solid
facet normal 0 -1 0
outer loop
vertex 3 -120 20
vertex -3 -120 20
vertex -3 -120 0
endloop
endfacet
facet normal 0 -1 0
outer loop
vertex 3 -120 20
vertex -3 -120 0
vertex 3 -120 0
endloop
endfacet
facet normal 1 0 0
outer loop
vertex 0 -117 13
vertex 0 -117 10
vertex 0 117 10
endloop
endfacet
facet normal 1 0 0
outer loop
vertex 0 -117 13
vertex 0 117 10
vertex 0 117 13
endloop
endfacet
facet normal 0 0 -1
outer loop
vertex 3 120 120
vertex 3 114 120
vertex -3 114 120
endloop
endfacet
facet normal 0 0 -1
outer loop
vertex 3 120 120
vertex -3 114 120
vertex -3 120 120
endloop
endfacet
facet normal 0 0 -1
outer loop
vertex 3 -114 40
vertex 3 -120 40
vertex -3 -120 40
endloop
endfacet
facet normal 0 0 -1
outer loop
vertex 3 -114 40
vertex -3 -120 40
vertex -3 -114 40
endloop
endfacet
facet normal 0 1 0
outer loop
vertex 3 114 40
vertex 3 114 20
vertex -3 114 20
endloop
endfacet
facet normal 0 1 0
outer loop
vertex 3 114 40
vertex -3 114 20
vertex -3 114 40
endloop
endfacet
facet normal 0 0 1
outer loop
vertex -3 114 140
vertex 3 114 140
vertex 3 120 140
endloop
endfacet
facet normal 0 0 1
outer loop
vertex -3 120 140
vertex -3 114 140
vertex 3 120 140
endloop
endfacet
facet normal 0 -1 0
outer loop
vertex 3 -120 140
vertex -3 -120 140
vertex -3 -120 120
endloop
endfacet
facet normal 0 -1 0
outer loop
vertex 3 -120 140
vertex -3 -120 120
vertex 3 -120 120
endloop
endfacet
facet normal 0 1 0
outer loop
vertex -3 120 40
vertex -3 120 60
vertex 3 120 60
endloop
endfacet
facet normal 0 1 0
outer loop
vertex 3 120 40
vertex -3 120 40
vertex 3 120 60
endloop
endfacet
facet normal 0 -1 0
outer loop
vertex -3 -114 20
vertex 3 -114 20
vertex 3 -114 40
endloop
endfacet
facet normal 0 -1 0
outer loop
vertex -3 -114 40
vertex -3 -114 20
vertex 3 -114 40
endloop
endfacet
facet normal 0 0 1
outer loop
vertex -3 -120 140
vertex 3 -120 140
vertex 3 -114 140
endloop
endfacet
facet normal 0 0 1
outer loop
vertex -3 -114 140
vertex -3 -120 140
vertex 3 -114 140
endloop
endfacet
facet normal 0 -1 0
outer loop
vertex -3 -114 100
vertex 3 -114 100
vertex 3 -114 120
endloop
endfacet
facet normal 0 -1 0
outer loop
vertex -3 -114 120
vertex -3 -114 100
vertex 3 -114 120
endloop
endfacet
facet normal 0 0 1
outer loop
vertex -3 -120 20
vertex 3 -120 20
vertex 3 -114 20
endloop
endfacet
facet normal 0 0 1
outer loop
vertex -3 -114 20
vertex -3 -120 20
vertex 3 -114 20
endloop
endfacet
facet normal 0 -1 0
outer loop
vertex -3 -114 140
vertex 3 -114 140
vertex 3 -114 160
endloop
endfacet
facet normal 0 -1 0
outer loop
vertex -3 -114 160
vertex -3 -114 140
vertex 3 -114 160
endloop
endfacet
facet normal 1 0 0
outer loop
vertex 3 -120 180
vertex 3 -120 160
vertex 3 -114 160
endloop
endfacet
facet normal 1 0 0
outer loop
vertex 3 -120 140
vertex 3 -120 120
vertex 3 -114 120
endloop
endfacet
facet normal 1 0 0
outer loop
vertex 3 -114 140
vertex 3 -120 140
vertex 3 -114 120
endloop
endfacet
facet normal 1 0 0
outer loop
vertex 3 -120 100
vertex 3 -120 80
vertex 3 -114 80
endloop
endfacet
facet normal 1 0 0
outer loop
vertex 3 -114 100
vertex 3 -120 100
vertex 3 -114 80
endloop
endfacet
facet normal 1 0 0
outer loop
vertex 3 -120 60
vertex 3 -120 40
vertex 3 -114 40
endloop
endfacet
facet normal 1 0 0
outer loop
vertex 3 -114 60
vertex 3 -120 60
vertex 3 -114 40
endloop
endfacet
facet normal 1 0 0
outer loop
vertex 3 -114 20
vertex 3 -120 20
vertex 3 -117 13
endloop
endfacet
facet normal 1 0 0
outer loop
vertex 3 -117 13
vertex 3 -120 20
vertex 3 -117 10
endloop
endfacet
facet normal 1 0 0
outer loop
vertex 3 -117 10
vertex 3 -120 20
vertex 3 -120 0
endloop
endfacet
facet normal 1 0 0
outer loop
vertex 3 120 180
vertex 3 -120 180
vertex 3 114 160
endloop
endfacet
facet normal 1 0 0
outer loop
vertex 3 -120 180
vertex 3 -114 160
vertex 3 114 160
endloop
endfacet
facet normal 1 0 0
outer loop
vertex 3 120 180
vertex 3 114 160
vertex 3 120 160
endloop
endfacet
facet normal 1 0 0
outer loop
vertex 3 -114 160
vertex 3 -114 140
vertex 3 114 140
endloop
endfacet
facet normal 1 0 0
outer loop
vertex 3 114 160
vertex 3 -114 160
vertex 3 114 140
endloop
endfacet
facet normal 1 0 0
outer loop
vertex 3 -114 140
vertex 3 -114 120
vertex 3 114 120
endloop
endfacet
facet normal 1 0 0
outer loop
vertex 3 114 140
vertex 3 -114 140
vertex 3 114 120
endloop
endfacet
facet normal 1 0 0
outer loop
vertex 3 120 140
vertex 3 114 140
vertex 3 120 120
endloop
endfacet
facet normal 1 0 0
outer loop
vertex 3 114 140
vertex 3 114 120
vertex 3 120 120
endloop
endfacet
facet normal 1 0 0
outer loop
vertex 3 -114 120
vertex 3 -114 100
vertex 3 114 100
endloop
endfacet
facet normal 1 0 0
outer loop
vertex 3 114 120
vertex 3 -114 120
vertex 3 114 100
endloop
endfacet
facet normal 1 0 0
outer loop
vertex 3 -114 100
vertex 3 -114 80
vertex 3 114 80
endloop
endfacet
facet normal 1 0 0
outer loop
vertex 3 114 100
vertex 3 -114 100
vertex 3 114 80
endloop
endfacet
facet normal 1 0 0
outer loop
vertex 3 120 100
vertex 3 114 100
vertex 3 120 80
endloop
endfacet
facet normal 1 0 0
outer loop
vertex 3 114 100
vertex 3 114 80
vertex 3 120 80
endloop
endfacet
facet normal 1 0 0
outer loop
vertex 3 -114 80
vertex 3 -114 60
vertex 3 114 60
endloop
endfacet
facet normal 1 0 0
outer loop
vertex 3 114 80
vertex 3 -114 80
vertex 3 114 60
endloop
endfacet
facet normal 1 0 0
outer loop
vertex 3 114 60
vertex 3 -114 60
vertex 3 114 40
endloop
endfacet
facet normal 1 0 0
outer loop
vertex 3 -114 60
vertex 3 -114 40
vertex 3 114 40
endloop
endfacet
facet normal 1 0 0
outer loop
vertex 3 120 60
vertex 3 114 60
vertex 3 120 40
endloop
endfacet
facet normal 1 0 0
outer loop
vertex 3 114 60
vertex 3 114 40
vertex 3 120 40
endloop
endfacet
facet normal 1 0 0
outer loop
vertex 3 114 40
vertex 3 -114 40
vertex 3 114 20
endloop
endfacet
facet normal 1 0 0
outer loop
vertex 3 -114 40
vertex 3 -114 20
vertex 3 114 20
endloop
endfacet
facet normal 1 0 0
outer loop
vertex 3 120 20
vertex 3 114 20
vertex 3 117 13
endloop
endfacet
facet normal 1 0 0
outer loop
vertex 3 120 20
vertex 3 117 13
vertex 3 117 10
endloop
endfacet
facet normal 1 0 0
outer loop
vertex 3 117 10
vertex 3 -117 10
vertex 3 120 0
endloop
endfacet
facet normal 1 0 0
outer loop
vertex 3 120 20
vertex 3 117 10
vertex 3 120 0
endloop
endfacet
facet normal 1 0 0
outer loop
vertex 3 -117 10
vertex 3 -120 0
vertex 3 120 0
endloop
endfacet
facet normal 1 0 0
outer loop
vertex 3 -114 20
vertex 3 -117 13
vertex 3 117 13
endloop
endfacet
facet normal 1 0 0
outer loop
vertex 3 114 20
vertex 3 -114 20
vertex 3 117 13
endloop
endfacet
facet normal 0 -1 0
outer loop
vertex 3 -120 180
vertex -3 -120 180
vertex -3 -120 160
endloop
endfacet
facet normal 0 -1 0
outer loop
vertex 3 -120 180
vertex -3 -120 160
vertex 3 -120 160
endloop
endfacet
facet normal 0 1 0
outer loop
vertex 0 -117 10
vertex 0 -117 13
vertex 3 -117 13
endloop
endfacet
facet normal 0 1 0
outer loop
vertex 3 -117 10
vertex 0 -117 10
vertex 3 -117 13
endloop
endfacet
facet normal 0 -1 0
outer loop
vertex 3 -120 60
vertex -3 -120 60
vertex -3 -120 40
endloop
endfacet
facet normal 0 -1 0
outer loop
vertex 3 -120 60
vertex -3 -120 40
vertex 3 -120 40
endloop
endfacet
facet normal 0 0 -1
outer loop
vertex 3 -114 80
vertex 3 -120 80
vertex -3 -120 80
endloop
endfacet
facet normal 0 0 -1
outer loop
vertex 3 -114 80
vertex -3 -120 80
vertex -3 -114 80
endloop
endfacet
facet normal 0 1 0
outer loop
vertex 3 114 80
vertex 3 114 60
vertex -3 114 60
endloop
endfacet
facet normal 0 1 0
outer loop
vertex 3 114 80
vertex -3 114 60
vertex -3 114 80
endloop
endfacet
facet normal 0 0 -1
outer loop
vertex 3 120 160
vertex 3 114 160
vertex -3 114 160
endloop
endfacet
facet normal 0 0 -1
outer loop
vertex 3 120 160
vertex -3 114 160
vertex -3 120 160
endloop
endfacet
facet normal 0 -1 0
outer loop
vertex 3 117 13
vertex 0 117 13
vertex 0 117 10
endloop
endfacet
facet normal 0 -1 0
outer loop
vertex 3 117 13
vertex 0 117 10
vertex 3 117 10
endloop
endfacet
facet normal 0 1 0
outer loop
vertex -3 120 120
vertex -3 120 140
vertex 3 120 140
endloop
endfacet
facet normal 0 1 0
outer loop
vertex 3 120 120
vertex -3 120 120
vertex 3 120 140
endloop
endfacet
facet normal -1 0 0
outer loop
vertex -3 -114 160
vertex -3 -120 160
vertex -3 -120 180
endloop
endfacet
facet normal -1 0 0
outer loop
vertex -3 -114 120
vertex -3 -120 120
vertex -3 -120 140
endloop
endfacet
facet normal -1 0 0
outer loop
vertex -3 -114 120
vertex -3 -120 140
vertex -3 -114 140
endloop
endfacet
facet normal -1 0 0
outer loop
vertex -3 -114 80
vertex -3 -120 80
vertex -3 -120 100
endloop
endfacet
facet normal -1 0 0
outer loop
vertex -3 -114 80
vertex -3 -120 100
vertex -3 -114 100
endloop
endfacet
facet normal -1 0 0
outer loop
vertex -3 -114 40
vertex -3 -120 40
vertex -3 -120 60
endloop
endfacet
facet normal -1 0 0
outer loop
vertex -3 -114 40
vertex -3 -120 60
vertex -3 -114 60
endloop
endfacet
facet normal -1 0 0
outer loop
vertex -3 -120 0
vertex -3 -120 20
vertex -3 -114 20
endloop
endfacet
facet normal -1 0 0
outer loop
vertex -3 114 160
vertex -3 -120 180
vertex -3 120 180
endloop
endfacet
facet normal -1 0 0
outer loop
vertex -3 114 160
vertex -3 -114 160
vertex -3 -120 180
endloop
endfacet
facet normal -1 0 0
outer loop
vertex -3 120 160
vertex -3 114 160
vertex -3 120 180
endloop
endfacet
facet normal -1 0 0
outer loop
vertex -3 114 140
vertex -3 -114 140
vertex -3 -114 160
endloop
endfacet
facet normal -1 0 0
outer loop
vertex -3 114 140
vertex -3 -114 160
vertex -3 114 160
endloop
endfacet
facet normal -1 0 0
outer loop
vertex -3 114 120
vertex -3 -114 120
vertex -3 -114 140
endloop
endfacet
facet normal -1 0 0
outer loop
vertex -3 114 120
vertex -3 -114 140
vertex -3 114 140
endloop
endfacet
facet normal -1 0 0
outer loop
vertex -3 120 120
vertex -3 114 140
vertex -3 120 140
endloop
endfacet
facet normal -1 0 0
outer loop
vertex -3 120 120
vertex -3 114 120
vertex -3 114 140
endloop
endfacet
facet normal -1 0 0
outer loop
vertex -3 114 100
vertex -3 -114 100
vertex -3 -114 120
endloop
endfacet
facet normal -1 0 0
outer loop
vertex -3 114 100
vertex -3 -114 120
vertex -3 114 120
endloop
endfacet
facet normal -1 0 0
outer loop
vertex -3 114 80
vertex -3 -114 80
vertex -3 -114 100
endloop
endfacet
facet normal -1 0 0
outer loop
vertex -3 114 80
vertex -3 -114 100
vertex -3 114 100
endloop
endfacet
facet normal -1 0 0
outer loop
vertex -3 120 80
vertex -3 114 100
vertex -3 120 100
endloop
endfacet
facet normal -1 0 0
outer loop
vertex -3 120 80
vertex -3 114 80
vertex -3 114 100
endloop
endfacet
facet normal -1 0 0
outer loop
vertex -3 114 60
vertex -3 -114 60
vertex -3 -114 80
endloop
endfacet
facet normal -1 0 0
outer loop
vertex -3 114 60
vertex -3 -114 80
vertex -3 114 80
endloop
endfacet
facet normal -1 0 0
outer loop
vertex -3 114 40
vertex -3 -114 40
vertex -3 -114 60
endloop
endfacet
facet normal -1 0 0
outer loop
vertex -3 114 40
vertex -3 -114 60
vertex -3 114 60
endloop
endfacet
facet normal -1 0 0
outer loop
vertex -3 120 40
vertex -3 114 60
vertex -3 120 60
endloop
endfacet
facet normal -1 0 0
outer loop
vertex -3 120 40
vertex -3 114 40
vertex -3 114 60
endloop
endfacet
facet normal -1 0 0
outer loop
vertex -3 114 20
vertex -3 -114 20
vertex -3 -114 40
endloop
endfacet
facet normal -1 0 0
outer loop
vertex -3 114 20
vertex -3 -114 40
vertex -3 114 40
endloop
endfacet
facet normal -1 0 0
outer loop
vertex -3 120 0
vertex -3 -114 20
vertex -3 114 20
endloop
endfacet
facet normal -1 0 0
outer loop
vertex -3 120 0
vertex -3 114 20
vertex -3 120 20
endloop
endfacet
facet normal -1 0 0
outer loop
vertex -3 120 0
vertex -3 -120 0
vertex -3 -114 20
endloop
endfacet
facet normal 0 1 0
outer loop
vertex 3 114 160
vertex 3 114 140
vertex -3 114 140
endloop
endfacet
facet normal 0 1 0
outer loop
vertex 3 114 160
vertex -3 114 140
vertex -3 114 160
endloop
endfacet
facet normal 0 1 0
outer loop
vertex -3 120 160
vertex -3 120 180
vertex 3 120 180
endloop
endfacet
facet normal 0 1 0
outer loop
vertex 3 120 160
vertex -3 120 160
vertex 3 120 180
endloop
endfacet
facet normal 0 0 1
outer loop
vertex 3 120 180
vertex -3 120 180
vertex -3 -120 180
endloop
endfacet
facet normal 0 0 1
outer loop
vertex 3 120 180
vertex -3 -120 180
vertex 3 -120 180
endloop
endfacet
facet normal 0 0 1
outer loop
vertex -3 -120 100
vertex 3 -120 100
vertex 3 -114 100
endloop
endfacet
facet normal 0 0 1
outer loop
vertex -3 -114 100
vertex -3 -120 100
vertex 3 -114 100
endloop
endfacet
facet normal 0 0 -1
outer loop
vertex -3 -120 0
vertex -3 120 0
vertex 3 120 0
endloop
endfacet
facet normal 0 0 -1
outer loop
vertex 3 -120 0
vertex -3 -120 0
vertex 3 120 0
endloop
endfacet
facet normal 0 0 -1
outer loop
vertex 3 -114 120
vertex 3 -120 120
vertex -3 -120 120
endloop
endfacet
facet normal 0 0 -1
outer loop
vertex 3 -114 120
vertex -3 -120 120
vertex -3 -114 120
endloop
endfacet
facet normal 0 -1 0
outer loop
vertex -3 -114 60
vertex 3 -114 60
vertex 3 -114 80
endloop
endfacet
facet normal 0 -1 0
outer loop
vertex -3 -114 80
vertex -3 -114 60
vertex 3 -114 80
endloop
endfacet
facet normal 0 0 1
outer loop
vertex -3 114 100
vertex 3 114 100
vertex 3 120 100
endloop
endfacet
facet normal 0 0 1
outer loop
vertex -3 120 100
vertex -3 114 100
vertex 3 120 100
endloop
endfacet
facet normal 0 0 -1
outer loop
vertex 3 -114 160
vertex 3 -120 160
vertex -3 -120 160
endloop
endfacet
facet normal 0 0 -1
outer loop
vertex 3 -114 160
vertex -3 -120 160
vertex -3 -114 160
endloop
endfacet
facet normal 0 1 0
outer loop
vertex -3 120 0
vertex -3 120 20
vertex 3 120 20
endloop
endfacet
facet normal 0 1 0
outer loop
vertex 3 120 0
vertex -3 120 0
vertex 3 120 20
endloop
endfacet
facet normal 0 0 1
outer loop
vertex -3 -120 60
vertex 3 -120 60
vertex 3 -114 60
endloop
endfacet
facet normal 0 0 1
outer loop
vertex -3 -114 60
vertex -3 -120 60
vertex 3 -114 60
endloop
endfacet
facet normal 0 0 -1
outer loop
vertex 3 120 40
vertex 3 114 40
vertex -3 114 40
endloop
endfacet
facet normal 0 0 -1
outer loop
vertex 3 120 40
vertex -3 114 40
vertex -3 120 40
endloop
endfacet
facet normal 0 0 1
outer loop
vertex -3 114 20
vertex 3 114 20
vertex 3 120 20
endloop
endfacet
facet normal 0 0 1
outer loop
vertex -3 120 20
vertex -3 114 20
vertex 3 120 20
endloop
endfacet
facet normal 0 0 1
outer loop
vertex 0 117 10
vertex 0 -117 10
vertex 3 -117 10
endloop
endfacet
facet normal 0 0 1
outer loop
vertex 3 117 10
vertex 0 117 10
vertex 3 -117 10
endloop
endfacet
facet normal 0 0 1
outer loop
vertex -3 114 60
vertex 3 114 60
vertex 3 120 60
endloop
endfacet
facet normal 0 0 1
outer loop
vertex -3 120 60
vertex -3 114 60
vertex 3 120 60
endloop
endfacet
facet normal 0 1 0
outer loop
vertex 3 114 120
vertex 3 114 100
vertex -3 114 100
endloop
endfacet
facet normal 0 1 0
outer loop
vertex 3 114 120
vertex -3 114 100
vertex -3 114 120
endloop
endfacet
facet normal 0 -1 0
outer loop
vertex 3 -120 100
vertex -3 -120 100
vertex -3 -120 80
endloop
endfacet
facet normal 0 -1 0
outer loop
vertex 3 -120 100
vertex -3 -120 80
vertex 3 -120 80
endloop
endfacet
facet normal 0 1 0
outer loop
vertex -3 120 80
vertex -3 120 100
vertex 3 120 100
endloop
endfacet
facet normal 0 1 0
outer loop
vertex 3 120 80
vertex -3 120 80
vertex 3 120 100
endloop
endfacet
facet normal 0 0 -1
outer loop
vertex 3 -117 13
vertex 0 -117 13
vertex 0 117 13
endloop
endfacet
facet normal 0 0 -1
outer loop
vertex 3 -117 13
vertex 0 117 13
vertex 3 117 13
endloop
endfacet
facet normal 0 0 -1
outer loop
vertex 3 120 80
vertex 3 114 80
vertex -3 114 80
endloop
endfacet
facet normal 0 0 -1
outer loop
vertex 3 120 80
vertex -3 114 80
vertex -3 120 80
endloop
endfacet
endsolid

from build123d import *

# Parameters (mm, degrees)
F0_W     = 6
F0_H     = 240
F1_DEPTH = 180
F3_START = -3
F2_W     = 3
F2_H     = 3
F3_DEPTH = 234
F4_W     = 6
F4_H     = 20
F5_DEPTH = 6.001


with BuildPart() as f1:
    # F0 (on Top) → F1 (new body)
    with BuildSketch(Plane.XY):
        Rectangle(F0_W, F0_H)
    extrude(amount=F1_DEPTH)

    # F2 (on face) → F3 (cut)
    with BuildSketch(Plane.XZ.offset(120).offset(F3_START)):
        with Locations((1.5, 11.5)):
            Rectangle(F2_W, F2_H)
    extrude(amount=-F3_DEPTH, mode=Mode.SUBTRACT)

    # F4 (on face) → F5 (cut, through all)
    with BuildSketch(Plane.YZ.offset(3)):
        with Locations((-117, 30)):
            Rectangle(F4_W, F4_H)
        with Locations((-117, 70)):
            Rectangle(F4_W, F4_H)
        with Locations((-117, 110)):
            Rectangle(F4_W, F4_H)
        with Locations((-117, 150)):
            Rectangle(F4_W, F4_H)
        with Locations((117, 150)):
            Rectangle(F4_W, F4_H)
        with Locations((117, 110)):
            Rectangle(F4_W, F4_H)
        with Locations((117, 70)):
            Rectangle(F4_W, F4_H)
        with Locations((117, 30)):
            Rectangle(F4_W, F4_H)
    extrude(amount=-F5_DEPTH, mode=Mode.SUBTRACT)


solid = f1.part
